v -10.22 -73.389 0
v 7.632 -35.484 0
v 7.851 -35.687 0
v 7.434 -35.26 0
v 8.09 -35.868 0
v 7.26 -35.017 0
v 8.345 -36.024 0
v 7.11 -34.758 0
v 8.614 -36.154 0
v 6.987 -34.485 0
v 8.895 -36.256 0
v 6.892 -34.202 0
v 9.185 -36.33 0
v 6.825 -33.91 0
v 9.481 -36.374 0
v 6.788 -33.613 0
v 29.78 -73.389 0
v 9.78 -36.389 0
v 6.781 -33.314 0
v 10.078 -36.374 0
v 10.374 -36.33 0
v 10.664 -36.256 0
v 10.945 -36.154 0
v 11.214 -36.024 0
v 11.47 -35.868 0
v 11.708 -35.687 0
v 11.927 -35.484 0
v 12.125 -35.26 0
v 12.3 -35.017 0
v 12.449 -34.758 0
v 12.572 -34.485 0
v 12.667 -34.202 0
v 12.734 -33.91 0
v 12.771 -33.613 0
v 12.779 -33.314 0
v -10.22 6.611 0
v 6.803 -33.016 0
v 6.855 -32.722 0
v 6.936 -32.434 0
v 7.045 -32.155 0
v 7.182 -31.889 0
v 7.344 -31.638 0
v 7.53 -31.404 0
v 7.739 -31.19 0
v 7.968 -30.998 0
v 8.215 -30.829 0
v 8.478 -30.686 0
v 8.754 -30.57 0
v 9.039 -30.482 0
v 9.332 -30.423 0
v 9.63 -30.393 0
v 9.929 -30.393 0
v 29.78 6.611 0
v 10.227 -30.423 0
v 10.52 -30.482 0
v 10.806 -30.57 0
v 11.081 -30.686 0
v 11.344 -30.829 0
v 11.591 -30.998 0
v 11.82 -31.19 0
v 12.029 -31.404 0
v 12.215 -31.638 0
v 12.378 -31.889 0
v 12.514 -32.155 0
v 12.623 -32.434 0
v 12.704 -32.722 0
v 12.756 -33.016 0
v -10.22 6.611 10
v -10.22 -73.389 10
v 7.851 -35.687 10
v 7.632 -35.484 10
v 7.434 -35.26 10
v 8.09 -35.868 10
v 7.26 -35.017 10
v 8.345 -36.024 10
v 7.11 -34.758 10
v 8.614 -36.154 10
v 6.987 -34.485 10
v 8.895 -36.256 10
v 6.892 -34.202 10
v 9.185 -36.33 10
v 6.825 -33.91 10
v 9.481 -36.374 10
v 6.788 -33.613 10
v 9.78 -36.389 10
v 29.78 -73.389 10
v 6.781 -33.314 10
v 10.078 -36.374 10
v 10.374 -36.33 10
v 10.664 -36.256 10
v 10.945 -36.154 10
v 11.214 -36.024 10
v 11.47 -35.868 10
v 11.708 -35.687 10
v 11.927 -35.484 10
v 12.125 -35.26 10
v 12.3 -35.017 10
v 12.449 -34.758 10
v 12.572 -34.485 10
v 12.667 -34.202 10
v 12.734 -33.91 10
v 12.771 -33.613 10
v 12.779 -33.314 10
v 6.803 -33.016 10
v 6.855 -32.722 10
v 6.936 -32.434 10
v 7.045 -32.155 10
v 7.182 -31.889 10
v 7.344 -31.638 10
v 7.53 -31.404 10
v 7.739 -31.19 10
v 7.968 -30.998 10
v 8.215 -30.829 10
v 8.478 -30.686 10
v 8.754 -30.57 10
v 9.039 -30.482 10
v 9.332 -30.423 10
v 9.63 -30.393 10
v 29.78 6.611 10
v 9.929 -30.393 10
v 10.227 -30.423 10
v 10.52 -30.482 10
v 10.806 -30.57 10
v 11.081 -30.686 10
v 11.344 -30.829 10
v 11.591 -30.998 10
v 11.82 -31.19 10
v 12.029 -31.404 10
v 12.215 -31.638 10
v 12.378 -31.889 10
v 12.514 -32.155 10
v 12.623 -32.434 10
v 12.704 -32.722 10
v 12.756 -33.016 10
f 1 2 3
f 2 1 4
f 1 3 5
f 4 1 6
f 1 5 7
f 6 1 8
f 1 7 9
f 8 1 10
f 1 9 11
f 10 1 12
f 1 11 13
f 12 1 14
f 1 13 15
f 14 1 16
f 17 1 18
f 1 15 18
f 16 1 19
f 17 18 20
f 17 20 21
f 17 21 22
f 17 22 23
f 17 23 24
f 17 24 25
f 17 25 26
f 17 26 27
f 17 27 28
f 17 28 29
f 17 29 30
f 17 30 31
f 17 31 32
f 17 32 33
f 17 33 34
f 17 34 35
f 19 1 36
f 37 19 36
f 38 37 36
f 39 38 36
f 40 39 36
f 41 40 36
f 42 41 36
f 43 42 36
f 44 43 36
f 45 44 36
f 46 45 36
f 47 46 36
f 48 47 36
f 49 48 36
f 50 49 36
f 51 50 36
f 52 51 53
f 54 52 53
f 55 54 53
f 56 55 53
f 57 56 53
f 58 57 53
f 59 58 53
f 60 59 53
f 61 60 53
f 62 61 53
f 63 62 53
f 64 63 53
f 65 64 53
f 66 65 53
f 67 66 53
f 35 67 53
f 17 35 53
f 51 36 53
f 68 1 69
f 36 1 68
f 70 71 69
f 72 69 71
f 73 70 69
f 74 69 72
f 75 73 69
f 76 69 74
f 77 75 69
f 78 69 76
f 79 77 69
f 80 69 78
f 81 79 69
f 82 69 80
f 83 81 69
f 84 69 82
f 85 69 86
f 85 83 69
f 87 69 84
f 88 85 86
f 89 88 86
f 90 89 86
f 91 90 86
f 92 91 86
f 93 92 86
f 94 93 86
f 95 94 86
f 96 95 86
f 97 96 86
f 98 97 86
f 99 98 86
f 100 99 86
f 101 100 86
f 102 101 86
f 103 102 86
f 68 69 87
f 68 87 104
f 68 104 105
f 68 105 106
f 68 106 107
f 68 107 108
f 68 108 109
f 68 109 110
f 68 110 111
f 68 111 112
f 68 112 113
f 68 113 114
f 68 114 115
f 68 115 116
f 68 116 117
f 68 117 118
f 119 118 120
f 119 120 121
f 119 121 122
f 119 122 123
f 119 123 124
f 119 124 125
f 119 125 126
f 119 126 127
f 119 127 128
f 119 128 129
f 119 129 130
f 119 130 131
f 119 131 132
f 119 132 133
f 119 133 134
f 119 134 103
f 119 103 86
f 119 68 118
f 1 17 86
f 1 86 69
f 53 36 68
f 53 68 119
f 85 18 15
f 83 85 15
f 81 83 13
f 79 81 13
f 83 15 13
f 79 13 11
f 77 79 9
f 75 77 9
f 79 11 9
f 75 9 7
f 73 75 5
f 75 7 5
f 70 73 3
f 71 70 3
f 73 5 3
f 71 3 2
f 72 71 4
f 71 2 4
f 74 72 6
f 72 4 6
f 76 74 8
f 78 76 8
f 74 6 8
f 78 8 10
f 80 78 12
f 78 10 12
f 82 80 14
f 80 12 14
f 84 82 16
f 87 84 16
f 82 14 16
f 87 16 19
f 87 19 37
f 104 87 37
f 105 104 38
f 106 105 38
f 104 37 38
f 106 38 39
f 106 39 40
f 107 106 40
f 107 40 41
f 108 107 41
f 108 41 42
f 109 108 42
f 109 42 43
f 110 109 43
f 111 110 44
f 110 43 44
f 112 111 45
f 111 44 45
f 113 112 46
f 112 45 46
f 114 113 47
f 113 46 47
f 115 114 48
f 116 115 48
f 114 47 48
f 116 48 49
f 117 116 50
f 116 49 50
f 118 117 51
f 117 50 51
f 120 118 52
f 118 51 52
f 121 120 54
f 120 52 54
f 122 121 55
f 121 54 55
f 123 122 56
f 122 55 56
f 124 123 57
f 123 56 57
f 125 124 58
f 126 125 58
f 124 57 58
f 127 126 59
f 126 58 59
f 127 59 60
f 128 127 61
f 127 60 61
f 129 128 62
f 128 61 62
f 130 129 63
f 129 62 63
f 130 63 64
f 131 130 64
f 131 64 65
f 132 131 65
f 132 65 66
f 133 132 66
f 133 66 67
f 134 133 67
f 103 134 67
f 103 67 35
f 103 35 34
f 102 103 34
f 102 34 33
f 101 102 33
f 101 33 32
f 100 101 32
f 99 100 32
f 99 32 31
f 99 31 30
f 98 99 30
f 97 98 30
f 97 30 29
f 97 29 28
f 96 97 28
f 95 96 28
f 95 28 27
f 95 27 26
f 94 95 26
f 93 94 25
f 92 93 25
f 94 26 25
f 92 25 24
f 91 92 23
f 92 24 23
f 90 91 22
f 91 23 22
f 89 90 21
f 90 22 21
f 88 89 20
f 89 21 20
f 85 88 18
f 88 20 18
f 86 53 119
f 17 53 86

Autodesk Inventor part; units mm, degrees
ref_plane "YZ Plane" through (0, 0, 0) normal (1, 0, 0) x (0, 1, 0)
ref_plane "XZ Plane" through (0, 0, 0) normal (0, 1, 0) x (-1, 0, 0)
ref_plane "XY Plane" through (0, 0, 0) normal (0, 0, 1) x (1, 0, 0)
sketch "スケッチ1" plane through (0, 0, 0) normal (0, 0, 1) x (1, 0, 0)
  line L0 (-10.2204, 6.6108) -> (29.7796, 6.6108)
  line L1 (29.7796, 6.6108) -> (29.7796, -73.3892)
  line L2 (29.7796, -73.3892) -> (-10.2204, -73.3892)
  line L3 (-10.2204, -73.3892) -> (-10.2204, 6.6108)
  point P0 (0, 0)
  dimension "d0" = 40
  dimension "d1" = 80
extrude "押し出し1" add sketch "スケッチ1" along normal blind 10
sketch "スケッチ2" plane through (0, 0, 10) normal (0, 0, 1) x (1, 0, 0)
  circle A0 centre (9.7796, -33.3892) radius 3
  line L0 (29.7796, 6.6108) -> (-10.2204, 6.6108) projected
  line L1 (-10.2204, 6.6108) -> (-10.2204, -73.3892) projected
  point P0 (0, 0)
  dimension "d4" = 6
  dimension "d5" = 40
  dimension "d6" = 20
hole "穴1" at (9.7796, -33.3892, 10) direction (0, 0, -1) diameter 6 depth 10
equation "\"BendRadius\" = Thickness"
equation "\"BendReliefWidth\" = Thickness"
equation "\"BendReliefDepth\" = 0.5 * Thickness"
equation "\"CornerReliefSize\" = 4 * Thickness"
equation "\"MinimumRemnant\" = 2 * Thickness"
equation "\"TransitionRadius\" = BendRadius"
equation "\"JacobiRadiusSize\" = BendRadius"
equation "\"GapSize\" = Thickness"
equation "\"Thickness\" = 0.5"
